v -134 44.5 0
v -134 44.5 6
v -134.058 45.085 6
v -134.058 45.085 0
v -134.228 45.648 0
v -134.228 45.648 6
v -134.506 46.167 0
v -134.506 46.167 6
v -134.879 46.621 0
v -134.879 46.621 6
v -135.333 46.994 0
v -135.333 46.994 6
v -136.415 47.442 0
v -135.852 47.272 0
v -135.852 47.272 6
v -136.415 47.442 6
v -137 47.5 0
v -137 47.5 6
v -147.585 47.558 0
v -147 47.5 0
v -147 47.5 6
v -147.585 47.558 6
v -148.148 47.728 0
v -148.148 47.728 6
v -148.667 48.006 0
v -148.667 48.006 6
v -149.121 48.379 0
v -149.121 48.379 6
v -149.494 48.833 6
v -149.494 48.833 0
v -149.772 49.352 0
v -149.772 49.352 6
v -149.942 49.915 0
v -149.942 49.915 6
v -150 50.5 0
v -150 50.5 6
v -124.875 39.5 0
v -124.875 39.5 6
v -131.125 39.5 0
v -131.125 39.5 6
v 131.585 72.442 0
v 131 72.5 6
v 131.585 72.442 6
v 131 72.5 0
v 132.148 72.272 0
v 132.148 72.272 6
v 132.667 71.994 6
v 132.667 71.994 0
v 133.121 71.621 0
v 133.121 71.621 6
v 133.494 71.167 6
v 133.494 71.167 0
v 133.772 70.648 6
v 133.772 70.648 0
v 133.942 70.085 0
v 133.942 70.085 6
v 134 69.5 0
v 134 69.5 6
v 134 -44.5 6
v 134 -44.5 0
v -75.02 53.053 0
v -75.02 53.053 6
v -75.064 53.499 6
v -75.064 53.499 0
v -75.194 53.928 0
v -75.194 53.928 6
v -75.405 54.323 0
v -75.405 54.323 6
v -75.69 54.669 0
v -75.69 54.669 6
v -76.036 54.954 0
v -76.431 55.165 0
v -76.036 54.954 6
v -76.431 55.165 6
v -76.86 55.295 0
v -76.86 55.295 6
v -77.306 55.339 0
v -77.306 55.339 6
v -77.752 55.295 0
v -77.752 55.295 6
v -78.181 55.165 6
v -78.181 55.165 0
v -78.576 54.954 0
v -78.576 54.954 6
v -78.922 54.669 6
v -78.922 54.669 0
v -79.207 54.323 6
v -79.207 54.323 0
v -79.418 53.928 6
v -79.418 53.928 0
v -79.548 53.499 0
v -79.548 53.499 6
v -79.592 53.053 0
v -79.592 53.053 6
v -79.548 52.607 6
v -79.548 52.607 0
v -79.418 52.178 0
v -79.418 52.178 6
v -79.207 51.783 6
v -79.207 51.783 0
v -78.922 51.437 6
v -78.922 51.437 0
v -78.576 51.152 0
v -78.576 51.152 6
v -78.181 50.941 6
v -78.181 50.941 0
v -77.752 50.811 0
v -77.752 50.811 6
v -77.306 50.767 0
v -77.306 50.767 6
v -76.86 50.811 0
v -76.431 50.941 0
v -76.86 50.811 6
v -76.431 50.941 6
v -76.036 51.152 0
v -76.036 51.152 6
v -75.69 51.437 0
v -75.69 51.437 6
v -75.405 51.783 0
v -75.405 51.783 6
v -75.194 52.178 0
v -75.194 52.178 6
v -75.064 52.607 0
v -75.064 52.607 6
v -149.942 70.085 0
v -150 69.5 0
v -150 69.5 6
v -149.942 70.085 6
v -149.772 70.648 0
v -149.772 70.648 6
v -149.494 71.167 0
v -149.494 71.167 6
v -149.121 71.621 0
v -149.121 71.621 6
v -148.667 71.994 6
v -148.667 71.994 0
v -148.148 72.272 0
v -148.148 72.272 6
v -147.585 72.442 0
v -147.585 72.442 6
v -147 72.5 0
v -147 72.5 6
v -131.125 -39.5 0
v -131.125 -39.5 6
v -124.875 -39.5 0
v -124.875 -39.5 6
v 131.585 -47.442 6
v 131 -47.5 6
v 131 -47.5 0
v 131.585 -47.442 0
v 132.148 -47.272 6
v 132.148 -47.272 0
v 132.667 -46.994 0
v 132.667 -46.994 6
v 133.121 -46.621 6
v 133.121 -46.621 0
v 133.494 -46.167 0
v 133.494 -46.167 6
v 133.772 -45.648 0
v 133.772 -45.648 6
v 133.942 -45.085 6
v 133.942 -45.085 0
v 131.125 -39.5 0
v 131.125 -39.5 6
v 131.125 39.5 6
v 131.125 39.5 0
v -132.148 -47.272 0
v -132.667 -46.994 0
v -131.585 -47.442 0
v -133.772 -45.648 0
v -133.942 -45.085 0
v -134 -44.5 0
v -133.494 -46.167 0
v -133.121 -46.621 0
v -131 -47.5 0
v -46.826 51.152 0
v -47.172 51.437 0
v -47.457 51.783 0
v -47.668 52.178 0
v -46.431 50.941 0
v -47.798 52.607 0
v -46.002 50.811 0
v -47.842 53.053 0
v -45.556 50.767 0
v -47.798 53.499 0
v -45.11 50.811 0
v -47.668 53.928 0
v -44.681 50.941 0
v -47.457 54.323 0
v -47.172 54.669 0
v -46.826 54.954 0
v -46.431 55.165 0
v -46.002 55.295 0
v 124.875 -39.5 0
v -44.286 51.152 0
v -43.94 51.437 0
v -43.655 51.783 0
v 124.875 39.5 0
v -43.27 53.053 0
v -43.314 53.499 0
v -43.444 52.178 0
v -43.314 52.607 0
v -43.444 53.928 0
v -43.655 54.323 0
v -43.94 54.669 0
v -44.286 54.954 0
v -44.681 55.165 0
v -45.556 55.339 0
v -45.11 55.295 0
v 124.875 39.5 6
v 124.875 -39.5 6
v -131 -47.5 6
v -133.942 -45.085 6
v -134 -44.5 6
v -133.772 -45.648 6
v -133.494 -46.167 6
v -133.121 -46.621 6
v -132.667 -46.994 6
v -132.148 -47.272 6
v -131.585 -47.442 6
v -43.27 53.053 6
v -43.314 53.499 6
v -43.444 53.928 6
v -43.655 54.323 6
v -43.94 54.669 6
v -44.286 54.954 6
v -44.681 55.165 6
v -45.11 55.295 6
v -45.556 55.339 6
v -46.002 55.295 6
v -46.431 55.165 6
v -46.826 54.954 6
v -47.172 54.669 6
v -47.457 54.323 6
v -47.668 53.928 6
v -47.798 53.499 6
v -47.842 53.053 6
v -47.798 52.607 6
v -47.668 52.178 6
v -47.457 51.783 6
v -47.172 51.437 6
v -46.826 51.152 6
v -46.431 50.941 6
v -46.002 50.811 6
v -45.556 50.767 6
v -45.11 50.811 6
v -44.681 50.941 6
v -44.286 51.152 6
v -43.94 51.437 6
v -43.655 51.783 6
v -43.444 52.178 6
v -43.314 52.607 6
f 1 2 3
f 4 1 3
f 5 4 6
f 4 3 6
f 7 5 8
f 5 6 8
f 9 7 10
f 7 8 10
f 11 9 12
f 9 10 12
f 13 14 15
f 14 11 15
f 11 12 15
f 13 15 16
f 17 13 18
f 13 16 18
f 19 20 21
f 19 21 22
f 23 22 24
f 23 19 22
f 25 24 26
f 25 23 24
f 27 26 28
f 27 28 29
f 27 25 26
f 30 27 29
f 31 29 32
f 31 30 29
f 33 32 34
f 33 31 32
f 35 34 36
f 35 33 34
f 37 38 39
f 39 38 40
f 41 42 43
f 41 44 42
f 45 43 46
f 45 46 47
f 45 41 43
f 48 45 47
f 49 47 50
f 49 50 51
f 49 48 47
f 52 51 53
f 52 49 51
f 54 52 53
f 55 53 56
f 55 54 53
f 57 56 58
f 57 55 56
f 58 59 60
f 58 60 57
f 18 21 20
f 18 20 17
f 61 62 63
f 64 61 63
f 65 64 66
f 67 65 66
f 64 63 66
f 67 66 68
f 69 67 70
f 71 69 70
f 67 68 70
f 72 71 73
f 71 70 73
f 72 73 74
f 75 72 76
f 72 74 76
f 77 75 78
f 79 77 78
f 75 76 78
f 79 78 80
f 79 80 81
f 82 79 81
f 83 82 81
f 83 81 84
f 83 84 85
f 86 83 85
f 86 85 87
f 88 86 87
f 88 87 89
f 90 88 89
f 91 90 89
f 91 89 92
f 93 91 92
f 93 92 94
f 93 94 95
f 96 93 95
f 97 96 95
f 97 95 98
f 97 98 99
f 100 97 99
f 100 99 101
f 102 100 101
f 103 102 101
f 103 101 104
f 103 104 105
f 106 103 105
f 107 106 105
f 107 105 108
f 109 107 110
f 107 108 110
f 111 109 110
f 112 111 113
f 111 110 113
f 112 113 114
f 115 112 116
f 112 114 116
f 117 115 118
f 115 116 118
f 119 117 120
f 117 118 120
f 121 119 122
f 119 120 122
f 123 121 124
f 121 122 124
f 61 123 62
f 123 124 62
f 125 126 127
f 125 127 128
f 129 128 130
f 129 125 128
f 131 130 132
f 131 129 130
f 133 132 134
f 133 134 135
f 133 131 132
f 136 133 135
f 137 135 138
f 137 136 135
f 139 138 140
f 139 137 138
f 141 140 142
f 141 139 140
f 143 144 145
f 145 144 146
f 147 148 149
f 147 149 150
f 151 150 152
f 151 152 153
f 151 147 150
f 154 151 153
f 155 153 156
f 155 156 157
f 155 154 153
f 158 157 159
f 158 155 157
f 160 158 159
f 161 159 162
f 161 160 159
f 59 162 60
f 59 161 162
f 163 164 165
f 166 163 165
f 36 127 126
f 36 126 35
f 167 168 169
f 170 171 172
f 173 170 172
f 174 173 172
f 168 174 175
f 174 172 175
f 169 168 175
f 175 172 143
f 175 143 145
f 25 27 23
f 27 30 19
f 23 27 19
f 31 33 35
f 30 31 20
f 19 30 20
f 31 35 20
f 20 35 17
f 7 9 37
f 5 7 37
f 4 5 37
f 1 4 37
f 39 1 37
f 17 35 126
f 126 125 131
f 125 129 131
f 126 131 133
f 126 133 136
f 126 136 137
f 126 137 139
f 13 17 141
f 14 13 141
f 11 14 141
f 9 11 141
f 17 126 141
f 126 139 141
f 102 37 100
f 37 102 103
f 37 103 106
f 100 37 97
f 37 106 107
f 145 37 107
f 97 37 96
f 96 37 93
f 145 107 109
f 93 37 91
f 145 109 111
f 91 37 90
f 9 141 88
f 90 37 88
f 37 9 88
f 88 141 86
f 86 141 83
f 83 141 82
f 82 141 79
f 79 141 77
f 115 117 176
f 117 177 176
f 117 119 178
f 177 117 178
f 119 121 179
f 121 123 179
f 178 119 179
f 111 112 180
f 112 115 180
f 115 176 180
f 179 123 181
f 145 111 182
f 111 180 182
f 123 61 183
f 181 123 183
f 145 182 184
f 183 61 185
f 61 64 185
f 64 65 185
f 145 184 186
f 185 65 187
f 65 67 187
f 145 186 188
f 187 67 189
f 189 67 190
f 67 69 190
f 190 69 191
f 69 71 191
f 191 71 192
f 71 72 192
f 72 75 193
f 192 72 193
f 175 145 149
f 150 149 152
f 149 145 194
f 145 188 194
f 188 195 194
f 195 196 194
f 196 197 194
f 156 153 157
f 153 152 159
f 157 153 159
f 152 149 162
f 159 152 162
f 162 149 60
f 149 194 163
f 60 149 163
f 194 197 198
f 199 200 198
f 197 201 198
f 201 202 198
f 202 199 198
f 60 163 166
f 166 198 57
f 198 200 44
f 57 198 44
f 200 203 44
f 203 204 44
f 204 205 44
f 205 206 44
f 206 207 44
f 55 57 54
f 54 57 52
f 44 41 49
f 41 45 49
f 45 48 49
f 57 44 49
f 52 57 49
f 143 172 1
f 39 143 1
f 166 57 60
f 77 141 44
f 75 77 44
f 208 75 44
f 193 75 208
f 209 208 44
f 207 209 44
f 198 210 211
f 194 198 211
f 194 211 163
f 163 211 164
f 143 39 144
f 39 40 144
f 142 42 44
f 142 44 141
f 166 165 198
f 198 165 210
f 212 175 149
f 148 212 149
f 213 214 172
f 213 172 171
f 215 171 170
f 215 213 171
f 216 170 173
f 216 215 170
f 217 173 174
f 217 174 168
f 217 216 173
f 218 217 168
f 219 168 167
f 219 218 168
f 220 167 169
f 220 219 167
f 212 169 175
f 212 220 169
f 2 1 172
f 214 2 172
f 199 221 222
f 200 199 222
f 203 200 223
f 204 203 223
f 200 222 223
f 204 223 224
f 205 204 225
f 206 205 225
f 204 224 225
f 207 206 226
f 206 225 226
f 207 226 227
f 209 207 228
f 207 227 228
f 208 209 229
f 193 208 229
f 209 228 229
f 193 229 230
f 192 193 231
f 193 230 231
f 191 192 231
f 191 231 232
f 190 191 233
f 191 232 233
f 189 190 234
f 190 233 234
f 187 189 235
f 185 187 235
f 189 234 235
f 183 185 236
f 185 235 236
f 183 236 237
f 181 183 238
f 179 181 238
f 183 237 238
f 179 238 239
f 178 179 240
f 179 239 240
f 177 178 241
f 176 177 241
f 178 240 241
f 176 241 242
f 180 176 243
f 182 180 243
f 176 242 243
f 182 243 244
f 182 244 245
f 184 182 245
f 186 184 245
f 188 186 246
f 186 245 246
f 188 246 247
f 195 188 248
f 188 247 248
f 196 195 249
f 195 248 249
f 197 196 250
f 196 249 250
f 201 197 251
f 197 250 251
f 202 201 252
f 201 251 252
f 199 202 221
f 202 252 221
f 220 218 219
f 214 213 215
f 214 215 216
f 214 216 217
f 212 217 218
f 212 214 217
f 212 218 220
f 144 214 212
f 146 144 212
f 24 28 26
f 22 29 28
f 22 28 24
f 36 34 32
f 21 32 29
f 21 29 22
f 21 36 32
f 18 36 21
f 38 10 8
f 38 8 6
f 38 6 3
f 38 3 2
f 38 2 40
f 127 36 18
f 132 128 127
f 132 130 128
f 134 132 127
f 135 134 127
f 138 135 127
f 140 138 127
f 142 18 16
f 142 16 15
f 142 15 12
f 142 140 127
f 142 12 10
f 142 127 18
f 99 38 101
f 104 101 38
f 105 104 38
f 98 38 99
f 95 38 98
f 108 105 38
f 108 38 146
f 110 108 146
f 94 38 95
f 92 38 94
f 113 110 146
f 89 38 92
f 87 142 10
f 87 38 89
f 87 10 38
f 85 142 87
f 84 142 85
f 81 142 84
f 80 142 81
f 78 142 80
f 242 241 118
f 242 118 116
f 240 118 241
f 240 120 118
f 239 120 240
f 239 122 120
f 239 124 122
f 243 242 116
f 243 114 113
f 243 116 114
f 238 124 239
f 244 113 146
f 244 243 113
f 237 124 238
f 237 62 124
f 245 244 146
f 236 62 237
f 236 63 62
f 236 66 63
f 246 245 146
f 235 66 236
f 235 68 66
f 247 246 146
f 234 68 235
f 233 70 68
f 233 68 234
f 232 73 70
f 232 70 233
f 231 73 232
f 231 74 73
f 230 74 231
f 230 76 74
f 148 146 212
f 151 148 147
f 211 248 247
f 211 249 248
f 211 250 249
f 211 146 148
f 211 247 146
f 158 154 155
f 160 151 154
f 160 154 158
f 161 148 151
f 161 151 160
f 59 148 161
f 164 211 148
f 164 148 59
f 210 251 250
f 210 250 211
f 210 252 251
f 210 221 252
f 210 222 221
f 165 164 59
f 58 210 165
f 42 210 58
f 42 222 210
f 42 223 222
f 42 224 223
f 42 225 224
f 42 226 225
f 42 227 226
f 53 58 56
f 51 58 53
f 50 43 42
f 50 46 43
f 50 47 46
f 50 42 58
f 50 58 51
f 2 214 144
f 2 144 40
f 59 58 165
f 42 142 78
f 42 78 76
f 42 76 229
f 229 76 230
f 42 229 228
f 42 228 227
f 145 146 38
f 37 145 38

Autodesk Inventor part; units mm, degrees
ref_plane "YZ Plane" through (0, 0, 0) normal (1, 0, 0) x (0, 1, 0)
ref_plane "XZ Plane" through (0, 0, 0) normal (0, 1, 0) x (-1, 0, 0)
ref_plane "XY Plane" through (0, 0, 0) normal (0, 0, 1) x (1, 0, 0)
sketch "Sketch1" plane through (0, 0, 0) normal (0, 0, 1) x (1, 0, 0)
  line L0 (-134, -47.5) -> (134, -47.5)
  line L1 (134, -47.5) -> (134, 47.5)
  line L2 (134, 47.5) -> (-134, 47.5)
  line L3 (-134, 47.5) -> (-134, -47.5)
  line L4 (-134, -47.5) -> (134, 47.5) construction
  line L5 (134, -47.5) -> (-134, 47.5) construction
  point P0 (0, 0)
  dimension "d0" = 95
  dimension "d1" = 268
extrude "Extrusion1" add sketch "Sketch1" along normal blind 6
sketch "Sketch2" plane through (0, 0, 6) normal (0, 0, 1) x (1, 0, 0)
  line L0 (-134, 47.5) -> (-134, -47.5) projected
  line L1 (-131.125, -39.5) -> (-124.875, -39.5)
  line L2 (-124.875, -39.5) -> (-124.875, 39.5)
  line L3 (-124.875, 39.5) -> (-131.125, 39.5)
  line L4 (-131.125, 39.5) -> (-131.125, -39.5)
  line L5 (-131.125, -39.5) -> (-124.875, 39.5) construction
  line L6 (-124.875, -39.5) -> (-131.125, 39.5) construction
  line L7 (124.875, -39.5) -> (131.125, -39.5)
  line L8 (131.125, -39.5) -> (131.125, 39.5)
  line L9 (131.125, 39.5) -> (124.875, 39.5)
  line L10 (124.875, 39.5) -> (124.875, -39.5)
  line L11 (124.875, -39.5) -> (131.125, 39.5) construction
  line L12 (131.125, -39.5) -> (124.875, 39.5) construction
  line L13 (-134, -47.5) -> (134, -47.5) projected
  line L14 (134, -47.5) -> (134, 47.5) projected
  point P0 (0, 0)
  point P1 (-128, 0)
  point P2 (128, 0)
  dimension "d4" = 6.25
  dimension "d5" = 2.875
  dimension "d23" = 8
  dimension "d24" = 2.875
extrude "Extrusion2" cut sketch "Sketch2" against normal through all
fillet "Fillet2" radius 3 2 edges at (-134, -47.5, 3) (134, -47.5, 3)
sketch "Sketch3" plane through (0, 0, 6) normal (0, 0, 1) x (1, 0, 0)
  line L0 (134, 47.5) -> (-134, 47.5) projected
  line L1 (-150, 47.5) -> (134, 47.5)
  line L2 (134, 47.5) -> (134, 72.5)
  line L3 (134, 72.5) -> (-150, 72.5)
  line L4 (-150, 72.5) -> (-150, 47.5)
  point P0 (0, 0)
  dimension "d12" = 25
  dimension "d25" = 150
extrude "Extrusion3" add sketch "Sketch3" against normal blind 6
fillet "Fillet3" radius 3 4 edges at (134, 72.5, 3) (-150, 47.5, 3) (-150, 72.5, 3) (-134, 47.5, 3)
sketch "Sketch5" plane through (0, 0, 6) normal (0, 0, 1) x (1, 0, 0)
  line L0 (-150, 50.5) -> (-150, 69.5) projected
  line L1 (-147, 72.5) -> (131, 72.5) projected
  circle A0 centre (-77.306, 53.053) radius 2.286
  circle A1 centre (-45.556, 53.053) radius 2.286
  point P0 (0, 0)
  dimension "d26" = 72.694
  dimension "d27" = 31.75
  dimension "d28" = 19.447
  dimension "d29" = 4.572
extrude "Extrusion5" cut sketch "Sketch5" against normal blind 10
equation "\"d24\" = d5"
properties part number "TopTopPanel"
